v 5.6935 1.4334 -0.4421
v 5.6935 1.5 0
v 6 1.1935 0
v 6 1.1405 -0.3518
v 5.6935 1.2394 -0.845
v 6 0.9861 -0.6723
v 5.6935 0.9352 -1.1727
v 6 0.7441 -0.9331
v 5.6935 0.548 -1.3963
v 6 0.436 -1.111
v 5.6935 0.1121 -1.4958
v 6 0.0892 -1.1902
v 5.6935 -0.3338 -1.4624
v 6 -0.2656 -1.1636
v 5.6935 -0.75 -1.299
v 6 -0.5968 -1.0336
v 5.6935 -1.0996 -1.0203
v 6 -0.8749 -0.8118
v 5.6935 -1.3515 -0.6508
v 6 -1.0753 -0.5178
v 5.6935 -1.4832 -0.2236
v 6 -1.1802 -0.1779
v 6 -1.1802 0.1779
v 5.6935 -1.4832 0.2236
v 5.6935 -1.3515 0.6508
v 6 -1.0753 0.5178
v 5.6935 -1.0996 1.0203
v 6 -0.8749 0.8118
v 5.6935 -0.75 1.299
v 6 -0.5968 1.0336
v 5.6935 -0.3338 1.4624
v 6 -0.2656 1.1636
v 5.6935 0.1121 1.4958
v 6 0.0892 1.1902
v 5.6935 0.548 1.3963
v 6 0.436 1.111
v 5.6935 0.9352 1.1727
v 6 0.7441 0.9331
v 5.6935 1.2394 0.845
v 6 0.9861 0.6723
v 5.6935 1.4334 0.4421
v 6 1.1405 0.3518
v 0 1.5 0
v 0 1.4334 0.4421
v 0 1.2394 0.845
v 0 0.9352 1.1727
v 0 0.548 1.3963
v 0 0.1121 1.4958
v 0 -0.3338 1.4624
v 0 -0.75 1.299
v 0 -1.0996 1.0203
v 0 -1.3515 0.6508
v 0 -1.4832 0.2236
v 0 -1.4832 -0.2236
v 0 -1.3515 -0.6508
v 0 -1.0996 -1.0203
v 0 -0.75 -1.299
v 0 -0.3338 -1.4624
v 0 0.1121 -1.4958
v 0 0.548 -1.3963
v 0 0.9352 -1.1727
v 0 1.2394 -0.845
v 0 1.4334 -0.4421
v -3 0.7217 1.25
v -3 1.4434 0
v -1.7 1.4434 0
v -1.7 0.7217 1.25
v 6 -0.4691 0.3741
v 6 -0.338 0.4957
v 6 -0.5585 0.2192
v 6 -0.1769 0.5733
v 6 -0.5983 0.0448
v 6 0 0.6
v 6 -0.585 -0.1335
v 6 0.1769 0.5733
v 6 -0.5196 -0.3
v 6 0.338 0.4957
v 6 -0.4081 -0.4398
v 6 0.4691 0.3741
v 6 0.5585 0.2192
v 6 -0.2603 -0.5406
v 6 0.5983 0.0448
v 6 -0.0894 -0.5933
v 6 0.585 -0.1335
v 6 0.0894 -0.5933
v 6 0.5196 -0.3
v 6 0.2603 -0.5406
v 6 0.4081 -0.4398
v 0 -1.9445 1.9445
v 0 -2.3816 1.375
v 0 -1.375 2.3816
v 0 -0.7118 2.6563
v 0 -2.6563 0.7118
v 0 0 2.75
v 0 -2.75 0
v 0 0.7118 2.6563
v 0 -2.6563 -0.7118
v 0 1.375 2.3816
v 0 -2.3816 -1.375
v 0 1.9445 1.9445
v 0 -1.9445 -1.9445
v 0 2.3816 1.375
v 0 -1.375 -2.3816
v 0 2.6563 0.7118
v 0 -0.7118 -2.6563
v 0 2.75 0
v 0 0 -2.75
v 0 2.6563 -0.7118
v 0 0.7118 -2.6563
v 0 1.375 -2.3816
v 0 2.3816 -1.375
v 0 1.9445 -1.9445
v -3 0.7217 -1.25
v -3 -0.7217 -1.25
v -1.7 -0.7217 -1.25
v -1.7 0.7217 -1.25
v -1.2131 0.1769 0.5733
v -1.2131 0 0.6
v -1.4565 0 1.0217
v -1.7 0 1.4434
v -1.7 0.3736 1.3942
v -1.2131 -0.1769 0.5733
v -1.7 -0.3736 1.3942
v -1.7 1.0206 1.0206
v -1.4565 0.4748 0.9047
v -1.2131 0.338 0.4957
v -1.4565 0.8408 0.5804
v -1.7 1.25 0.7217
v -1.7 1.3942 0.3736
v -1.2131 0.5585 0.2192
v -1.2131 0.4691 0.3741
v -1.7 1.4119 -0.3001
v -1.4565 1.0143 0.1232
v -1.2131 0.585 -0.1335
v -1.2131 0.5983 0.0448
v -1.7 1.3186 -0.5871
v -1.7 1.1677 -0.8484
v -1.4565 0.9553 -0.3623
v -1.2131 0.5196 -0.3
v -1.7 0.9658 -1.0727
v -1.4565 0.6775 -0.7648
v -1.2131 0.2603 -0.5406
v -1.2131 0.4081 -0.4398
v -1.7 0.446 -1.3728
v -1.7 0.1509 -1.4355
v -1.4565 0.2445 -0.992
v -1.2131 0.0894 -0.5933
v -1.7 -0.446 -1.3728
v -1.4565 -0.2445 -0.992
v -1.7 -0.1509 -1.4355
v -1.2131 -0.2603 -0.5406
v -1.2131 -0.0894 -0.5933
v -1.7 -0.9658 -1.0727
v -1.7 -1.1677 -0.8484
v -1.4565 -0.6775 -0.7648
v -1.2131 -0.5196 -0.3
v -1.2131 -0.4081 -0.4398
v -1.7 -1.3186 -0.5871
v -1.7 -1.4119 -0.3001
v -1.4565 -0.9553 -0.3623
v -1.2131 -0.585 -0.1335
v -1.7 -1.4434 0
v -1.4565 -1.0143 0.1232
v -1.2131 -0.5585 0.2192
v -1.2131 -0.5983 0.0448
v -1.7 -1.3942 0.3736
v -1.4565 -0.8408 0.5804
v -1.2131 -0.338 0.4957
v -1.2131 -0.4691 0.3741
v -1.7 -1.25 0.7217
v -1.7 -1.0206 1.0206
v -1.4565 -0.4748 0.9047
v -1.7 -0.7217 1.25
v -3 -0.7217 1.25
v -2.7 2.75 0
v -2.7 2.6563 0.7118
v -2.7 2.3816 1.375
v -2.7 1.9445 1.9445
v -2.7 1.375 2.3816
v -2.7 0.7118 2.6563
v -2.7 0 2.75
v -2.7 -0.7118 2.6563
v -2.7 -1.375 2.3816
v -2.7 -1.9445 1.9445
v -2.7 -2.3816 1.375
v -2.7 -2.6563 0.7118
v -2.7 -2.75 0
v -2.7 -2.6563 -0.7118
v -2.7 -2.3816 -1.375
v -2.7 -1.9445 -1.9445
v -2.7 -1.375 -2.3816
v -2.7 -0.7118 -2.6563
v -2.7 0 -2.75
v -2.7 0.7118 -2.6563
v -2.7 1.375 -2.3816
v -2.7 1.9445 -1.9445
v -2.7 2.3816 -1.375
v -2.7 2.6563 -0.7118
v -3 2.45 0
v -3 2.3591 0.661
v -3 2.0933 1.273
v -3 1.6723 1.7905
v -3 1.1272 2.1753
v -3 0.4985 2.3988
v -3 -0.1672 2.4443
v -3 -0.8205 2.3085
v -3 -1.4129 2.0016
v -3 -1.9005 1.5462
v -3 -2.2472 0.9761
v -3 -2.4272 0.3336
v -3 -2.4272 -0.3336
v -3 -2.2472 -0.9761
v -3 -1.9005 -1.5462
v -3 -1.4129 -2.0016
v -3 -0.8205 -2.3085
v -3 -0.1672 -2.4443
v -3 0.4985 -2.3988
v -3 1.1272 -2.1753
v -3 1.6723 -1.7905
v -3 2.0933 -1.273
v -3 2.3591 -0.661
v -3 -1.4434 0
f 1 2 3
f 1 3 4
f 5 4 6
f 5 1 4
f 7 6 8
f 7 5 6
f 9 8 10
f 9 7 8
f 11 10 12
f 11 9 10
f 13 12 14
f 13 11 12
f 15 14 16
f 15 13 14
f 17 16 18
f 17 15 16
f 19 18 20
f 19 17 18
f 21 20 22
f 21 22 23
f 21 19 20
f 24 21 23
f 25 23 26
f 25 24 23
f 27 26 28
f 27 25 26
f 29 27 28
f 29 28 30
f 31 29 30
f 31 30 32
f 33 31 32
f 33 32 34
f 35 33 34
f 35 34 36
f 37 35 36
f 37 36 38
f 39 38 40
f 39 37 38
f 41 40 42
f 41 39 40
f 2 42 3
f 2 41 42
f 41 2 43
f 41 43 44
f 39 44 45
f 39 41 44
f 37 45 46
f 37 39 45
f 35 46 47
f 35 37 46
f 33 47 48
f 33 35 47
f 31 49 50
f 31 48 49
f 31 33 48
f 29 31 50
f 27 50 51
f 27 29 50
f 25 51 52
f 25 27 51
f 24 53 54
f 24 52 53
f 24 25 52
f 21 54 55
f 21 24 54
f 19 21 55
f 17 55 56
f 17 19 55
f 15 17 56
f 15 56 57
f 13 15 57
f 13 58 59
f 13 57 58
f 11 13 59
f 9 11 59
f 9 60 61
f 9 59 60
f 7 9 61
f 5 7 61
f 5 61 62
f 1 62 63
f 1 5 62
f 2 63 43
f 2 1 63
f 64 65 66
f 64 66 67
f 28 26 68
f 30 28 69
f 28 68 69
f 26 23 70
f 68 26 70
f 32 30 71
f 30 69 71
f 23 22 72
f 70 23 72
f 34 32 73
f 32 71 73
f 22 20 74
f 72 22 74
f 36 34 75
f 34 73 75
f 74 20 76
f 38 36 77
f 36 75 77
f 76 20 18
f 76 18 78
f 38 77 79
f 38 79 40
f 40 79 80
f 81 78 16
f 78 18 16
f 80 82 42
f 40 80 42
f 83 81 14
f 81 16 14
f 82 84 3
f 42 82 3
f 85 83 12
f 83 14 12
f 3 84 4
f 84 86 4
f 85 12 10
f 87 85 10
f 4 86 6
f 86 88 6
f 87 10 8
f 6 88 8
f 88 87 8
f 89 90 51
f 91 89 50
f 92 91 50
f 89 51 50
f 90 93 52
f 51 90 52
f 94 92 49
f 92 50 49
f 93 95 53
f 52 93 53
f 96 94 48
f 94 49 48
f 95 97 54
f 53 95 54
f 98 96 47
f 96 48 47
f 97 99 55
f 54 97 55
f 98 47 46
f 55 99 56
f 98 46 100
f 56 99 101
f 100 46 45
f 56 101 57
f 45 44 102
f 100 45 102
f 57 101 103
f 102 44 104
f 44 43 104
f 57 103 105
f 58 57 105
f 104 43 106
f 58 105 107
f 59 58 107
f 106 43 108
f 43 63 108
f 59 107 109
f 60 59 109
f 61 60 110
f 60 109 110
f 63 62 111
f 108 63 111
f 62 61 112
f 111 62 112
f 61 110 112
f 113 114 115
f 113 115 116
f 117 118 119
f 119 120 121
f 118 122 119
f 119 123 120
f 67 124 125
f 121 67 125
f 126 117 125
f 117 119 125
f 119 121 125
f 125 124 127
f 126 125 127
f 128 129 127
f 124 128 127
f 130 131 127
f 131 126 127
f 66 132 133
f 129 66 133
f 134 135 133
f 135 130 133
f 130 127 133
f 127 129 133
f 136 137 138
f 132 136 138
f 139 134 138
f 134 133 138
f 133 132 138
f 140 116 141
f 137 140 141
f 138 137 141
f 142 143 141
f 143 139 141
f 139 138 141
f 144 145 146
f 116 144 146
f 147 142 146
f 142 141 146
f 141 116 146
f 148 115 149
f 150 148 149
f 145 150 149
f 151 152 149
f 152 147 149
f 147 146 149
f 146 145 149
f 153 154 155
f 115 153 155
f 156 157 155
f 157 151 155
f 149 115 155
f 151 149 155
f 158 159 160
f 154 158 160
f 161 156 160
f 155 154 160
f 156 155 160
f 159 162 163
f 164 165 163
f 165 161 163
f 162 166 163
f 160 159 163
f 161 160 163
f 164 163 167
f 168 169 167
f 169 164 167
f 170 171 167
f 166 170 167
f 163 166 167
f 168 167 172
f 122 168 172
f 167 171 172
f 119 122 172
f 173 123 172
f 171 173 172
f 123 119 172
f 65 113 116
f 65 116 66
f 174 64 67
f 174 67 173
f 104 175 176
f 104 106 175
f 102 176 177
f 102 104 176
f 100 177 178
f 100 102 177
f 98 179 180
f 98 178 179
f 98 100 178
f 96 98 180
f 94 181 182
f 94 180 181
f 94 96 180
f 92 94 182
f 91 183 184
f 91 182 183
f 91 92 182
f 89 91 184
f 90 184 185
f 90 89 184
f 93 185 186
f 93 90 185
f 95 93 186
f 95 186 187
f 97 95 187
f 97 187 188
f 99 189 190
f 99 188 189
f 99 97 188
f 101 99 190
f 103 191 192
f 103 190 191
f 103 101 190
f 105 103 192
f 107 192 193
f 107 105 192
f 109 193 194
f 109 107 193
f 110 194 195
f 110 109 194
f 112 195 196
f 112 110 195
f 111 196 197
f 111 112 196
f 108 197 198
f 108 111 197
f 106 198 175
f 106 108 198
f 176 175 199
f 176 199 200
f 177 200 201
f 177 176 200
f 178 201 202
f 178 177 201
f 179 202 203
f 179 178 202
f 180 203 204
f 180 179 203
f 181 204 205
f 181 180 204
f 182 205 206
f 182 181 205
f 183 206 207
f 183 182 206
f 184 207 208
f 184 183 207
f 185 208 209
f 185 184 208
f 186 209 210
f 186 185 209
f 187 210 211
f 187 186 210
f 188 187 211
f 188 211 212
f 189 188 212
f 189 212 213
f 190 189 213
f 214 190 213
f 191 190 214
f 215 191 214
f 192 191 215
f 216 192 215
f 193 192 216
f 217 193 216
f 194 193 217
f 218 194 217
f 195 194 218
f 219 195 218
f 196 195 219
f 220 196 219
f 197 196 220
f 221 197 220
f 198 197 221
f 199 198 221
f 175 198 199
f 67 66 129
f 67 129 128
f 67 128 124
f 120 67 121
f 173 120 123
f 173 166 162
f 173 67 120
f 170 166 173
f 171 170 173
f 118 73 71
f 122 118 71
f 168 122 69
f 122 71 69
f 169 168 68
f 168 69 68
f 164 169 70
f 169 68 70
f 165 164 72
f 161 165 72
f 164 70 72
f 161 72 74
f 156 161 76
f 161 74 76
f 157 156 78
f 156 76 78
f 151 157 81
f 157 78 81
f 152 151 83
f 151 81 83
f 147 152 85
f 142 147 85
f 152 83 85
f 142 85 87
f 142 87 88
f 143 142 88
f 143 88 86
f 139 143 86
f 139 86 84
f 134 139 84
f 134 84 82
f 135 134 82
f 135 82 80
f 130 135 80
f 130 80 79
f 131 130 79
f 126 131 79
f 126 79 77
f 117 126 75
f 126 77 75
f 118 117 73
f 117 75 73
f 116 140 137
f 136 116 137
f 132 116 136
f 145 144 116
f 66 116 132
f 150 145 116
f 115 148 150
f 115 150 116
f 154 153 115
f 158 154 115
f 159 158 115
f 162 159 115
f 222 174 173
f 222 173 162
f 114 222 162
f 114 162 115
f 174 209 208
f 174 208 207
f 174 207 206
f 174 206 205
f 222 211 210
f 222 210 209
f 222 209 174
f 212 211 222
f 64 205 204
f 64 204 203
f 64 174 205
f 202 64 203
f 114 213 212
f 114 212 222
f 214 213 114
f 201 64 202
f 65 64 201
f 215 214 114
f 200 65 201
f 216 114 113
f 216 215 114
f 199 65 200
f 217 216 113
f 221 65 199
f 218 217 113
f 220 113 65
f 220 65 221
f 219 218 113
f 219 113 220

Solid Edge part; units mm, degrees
sketch "Sketch1" plane through (0, 0, 0) normal (0, 0, 1) x (1, 0, 0)
  line L0 (-3, 0) -> (-3, 2.45)
  line L1 (-3, 2.45) -> (-2.7, 2.75)
  line L2 (-2.7, 2.75) -> (0, 2.75)
  line L3 (0, 2.75) -> (0, 1.5)
  line L4 (0, 1.5) -> (5.6935, 1.5)
  line L5 (5.6935, 1.5) -> (6, 1.1935)
  line L6 (6, 1.1935) -> (6, 0)
  line L7 (6, 0) -> (-3, 0)
revolve "RevolvedProtrusion1" add sketch "Sketch1" angle 360 about axis through (6, 0, 0) along (-1, 0, 0)
cosmetic_thread "Thread1" size "M3"
sketch "Sketch2" plane through (-3, 0, 0) normal (1, 0, 0) x (0, 1, 0)
  line L0 (-0.7217, 1.25) -> (-1.4434, 0)
  line L1 (-1.4434, 0) -> (-0.7217, -1.25)
  line L2 (-0.7217, -1.25) -> (0.7217, -1.25)
  line L3 (0.7217, -1.25) -> (1.4434, 0)
  line L4 (1.4434, 0) -> (0.7217, 1.25)
  line L5 (0.7217, 1.25) -> (-0.7217, 1.25)
extrude "ExtrudedCutout_1" cut sketch "Sketch2" along normal blind 1.3
hole "Hole_1" at (-1.7, 0, 0) direction (1, 0, 0) diameter 1.2 depth 7.7 countersink diameter 2.8868 countersink angle 120
properties part number "SVSS-M3-6-MOS"
